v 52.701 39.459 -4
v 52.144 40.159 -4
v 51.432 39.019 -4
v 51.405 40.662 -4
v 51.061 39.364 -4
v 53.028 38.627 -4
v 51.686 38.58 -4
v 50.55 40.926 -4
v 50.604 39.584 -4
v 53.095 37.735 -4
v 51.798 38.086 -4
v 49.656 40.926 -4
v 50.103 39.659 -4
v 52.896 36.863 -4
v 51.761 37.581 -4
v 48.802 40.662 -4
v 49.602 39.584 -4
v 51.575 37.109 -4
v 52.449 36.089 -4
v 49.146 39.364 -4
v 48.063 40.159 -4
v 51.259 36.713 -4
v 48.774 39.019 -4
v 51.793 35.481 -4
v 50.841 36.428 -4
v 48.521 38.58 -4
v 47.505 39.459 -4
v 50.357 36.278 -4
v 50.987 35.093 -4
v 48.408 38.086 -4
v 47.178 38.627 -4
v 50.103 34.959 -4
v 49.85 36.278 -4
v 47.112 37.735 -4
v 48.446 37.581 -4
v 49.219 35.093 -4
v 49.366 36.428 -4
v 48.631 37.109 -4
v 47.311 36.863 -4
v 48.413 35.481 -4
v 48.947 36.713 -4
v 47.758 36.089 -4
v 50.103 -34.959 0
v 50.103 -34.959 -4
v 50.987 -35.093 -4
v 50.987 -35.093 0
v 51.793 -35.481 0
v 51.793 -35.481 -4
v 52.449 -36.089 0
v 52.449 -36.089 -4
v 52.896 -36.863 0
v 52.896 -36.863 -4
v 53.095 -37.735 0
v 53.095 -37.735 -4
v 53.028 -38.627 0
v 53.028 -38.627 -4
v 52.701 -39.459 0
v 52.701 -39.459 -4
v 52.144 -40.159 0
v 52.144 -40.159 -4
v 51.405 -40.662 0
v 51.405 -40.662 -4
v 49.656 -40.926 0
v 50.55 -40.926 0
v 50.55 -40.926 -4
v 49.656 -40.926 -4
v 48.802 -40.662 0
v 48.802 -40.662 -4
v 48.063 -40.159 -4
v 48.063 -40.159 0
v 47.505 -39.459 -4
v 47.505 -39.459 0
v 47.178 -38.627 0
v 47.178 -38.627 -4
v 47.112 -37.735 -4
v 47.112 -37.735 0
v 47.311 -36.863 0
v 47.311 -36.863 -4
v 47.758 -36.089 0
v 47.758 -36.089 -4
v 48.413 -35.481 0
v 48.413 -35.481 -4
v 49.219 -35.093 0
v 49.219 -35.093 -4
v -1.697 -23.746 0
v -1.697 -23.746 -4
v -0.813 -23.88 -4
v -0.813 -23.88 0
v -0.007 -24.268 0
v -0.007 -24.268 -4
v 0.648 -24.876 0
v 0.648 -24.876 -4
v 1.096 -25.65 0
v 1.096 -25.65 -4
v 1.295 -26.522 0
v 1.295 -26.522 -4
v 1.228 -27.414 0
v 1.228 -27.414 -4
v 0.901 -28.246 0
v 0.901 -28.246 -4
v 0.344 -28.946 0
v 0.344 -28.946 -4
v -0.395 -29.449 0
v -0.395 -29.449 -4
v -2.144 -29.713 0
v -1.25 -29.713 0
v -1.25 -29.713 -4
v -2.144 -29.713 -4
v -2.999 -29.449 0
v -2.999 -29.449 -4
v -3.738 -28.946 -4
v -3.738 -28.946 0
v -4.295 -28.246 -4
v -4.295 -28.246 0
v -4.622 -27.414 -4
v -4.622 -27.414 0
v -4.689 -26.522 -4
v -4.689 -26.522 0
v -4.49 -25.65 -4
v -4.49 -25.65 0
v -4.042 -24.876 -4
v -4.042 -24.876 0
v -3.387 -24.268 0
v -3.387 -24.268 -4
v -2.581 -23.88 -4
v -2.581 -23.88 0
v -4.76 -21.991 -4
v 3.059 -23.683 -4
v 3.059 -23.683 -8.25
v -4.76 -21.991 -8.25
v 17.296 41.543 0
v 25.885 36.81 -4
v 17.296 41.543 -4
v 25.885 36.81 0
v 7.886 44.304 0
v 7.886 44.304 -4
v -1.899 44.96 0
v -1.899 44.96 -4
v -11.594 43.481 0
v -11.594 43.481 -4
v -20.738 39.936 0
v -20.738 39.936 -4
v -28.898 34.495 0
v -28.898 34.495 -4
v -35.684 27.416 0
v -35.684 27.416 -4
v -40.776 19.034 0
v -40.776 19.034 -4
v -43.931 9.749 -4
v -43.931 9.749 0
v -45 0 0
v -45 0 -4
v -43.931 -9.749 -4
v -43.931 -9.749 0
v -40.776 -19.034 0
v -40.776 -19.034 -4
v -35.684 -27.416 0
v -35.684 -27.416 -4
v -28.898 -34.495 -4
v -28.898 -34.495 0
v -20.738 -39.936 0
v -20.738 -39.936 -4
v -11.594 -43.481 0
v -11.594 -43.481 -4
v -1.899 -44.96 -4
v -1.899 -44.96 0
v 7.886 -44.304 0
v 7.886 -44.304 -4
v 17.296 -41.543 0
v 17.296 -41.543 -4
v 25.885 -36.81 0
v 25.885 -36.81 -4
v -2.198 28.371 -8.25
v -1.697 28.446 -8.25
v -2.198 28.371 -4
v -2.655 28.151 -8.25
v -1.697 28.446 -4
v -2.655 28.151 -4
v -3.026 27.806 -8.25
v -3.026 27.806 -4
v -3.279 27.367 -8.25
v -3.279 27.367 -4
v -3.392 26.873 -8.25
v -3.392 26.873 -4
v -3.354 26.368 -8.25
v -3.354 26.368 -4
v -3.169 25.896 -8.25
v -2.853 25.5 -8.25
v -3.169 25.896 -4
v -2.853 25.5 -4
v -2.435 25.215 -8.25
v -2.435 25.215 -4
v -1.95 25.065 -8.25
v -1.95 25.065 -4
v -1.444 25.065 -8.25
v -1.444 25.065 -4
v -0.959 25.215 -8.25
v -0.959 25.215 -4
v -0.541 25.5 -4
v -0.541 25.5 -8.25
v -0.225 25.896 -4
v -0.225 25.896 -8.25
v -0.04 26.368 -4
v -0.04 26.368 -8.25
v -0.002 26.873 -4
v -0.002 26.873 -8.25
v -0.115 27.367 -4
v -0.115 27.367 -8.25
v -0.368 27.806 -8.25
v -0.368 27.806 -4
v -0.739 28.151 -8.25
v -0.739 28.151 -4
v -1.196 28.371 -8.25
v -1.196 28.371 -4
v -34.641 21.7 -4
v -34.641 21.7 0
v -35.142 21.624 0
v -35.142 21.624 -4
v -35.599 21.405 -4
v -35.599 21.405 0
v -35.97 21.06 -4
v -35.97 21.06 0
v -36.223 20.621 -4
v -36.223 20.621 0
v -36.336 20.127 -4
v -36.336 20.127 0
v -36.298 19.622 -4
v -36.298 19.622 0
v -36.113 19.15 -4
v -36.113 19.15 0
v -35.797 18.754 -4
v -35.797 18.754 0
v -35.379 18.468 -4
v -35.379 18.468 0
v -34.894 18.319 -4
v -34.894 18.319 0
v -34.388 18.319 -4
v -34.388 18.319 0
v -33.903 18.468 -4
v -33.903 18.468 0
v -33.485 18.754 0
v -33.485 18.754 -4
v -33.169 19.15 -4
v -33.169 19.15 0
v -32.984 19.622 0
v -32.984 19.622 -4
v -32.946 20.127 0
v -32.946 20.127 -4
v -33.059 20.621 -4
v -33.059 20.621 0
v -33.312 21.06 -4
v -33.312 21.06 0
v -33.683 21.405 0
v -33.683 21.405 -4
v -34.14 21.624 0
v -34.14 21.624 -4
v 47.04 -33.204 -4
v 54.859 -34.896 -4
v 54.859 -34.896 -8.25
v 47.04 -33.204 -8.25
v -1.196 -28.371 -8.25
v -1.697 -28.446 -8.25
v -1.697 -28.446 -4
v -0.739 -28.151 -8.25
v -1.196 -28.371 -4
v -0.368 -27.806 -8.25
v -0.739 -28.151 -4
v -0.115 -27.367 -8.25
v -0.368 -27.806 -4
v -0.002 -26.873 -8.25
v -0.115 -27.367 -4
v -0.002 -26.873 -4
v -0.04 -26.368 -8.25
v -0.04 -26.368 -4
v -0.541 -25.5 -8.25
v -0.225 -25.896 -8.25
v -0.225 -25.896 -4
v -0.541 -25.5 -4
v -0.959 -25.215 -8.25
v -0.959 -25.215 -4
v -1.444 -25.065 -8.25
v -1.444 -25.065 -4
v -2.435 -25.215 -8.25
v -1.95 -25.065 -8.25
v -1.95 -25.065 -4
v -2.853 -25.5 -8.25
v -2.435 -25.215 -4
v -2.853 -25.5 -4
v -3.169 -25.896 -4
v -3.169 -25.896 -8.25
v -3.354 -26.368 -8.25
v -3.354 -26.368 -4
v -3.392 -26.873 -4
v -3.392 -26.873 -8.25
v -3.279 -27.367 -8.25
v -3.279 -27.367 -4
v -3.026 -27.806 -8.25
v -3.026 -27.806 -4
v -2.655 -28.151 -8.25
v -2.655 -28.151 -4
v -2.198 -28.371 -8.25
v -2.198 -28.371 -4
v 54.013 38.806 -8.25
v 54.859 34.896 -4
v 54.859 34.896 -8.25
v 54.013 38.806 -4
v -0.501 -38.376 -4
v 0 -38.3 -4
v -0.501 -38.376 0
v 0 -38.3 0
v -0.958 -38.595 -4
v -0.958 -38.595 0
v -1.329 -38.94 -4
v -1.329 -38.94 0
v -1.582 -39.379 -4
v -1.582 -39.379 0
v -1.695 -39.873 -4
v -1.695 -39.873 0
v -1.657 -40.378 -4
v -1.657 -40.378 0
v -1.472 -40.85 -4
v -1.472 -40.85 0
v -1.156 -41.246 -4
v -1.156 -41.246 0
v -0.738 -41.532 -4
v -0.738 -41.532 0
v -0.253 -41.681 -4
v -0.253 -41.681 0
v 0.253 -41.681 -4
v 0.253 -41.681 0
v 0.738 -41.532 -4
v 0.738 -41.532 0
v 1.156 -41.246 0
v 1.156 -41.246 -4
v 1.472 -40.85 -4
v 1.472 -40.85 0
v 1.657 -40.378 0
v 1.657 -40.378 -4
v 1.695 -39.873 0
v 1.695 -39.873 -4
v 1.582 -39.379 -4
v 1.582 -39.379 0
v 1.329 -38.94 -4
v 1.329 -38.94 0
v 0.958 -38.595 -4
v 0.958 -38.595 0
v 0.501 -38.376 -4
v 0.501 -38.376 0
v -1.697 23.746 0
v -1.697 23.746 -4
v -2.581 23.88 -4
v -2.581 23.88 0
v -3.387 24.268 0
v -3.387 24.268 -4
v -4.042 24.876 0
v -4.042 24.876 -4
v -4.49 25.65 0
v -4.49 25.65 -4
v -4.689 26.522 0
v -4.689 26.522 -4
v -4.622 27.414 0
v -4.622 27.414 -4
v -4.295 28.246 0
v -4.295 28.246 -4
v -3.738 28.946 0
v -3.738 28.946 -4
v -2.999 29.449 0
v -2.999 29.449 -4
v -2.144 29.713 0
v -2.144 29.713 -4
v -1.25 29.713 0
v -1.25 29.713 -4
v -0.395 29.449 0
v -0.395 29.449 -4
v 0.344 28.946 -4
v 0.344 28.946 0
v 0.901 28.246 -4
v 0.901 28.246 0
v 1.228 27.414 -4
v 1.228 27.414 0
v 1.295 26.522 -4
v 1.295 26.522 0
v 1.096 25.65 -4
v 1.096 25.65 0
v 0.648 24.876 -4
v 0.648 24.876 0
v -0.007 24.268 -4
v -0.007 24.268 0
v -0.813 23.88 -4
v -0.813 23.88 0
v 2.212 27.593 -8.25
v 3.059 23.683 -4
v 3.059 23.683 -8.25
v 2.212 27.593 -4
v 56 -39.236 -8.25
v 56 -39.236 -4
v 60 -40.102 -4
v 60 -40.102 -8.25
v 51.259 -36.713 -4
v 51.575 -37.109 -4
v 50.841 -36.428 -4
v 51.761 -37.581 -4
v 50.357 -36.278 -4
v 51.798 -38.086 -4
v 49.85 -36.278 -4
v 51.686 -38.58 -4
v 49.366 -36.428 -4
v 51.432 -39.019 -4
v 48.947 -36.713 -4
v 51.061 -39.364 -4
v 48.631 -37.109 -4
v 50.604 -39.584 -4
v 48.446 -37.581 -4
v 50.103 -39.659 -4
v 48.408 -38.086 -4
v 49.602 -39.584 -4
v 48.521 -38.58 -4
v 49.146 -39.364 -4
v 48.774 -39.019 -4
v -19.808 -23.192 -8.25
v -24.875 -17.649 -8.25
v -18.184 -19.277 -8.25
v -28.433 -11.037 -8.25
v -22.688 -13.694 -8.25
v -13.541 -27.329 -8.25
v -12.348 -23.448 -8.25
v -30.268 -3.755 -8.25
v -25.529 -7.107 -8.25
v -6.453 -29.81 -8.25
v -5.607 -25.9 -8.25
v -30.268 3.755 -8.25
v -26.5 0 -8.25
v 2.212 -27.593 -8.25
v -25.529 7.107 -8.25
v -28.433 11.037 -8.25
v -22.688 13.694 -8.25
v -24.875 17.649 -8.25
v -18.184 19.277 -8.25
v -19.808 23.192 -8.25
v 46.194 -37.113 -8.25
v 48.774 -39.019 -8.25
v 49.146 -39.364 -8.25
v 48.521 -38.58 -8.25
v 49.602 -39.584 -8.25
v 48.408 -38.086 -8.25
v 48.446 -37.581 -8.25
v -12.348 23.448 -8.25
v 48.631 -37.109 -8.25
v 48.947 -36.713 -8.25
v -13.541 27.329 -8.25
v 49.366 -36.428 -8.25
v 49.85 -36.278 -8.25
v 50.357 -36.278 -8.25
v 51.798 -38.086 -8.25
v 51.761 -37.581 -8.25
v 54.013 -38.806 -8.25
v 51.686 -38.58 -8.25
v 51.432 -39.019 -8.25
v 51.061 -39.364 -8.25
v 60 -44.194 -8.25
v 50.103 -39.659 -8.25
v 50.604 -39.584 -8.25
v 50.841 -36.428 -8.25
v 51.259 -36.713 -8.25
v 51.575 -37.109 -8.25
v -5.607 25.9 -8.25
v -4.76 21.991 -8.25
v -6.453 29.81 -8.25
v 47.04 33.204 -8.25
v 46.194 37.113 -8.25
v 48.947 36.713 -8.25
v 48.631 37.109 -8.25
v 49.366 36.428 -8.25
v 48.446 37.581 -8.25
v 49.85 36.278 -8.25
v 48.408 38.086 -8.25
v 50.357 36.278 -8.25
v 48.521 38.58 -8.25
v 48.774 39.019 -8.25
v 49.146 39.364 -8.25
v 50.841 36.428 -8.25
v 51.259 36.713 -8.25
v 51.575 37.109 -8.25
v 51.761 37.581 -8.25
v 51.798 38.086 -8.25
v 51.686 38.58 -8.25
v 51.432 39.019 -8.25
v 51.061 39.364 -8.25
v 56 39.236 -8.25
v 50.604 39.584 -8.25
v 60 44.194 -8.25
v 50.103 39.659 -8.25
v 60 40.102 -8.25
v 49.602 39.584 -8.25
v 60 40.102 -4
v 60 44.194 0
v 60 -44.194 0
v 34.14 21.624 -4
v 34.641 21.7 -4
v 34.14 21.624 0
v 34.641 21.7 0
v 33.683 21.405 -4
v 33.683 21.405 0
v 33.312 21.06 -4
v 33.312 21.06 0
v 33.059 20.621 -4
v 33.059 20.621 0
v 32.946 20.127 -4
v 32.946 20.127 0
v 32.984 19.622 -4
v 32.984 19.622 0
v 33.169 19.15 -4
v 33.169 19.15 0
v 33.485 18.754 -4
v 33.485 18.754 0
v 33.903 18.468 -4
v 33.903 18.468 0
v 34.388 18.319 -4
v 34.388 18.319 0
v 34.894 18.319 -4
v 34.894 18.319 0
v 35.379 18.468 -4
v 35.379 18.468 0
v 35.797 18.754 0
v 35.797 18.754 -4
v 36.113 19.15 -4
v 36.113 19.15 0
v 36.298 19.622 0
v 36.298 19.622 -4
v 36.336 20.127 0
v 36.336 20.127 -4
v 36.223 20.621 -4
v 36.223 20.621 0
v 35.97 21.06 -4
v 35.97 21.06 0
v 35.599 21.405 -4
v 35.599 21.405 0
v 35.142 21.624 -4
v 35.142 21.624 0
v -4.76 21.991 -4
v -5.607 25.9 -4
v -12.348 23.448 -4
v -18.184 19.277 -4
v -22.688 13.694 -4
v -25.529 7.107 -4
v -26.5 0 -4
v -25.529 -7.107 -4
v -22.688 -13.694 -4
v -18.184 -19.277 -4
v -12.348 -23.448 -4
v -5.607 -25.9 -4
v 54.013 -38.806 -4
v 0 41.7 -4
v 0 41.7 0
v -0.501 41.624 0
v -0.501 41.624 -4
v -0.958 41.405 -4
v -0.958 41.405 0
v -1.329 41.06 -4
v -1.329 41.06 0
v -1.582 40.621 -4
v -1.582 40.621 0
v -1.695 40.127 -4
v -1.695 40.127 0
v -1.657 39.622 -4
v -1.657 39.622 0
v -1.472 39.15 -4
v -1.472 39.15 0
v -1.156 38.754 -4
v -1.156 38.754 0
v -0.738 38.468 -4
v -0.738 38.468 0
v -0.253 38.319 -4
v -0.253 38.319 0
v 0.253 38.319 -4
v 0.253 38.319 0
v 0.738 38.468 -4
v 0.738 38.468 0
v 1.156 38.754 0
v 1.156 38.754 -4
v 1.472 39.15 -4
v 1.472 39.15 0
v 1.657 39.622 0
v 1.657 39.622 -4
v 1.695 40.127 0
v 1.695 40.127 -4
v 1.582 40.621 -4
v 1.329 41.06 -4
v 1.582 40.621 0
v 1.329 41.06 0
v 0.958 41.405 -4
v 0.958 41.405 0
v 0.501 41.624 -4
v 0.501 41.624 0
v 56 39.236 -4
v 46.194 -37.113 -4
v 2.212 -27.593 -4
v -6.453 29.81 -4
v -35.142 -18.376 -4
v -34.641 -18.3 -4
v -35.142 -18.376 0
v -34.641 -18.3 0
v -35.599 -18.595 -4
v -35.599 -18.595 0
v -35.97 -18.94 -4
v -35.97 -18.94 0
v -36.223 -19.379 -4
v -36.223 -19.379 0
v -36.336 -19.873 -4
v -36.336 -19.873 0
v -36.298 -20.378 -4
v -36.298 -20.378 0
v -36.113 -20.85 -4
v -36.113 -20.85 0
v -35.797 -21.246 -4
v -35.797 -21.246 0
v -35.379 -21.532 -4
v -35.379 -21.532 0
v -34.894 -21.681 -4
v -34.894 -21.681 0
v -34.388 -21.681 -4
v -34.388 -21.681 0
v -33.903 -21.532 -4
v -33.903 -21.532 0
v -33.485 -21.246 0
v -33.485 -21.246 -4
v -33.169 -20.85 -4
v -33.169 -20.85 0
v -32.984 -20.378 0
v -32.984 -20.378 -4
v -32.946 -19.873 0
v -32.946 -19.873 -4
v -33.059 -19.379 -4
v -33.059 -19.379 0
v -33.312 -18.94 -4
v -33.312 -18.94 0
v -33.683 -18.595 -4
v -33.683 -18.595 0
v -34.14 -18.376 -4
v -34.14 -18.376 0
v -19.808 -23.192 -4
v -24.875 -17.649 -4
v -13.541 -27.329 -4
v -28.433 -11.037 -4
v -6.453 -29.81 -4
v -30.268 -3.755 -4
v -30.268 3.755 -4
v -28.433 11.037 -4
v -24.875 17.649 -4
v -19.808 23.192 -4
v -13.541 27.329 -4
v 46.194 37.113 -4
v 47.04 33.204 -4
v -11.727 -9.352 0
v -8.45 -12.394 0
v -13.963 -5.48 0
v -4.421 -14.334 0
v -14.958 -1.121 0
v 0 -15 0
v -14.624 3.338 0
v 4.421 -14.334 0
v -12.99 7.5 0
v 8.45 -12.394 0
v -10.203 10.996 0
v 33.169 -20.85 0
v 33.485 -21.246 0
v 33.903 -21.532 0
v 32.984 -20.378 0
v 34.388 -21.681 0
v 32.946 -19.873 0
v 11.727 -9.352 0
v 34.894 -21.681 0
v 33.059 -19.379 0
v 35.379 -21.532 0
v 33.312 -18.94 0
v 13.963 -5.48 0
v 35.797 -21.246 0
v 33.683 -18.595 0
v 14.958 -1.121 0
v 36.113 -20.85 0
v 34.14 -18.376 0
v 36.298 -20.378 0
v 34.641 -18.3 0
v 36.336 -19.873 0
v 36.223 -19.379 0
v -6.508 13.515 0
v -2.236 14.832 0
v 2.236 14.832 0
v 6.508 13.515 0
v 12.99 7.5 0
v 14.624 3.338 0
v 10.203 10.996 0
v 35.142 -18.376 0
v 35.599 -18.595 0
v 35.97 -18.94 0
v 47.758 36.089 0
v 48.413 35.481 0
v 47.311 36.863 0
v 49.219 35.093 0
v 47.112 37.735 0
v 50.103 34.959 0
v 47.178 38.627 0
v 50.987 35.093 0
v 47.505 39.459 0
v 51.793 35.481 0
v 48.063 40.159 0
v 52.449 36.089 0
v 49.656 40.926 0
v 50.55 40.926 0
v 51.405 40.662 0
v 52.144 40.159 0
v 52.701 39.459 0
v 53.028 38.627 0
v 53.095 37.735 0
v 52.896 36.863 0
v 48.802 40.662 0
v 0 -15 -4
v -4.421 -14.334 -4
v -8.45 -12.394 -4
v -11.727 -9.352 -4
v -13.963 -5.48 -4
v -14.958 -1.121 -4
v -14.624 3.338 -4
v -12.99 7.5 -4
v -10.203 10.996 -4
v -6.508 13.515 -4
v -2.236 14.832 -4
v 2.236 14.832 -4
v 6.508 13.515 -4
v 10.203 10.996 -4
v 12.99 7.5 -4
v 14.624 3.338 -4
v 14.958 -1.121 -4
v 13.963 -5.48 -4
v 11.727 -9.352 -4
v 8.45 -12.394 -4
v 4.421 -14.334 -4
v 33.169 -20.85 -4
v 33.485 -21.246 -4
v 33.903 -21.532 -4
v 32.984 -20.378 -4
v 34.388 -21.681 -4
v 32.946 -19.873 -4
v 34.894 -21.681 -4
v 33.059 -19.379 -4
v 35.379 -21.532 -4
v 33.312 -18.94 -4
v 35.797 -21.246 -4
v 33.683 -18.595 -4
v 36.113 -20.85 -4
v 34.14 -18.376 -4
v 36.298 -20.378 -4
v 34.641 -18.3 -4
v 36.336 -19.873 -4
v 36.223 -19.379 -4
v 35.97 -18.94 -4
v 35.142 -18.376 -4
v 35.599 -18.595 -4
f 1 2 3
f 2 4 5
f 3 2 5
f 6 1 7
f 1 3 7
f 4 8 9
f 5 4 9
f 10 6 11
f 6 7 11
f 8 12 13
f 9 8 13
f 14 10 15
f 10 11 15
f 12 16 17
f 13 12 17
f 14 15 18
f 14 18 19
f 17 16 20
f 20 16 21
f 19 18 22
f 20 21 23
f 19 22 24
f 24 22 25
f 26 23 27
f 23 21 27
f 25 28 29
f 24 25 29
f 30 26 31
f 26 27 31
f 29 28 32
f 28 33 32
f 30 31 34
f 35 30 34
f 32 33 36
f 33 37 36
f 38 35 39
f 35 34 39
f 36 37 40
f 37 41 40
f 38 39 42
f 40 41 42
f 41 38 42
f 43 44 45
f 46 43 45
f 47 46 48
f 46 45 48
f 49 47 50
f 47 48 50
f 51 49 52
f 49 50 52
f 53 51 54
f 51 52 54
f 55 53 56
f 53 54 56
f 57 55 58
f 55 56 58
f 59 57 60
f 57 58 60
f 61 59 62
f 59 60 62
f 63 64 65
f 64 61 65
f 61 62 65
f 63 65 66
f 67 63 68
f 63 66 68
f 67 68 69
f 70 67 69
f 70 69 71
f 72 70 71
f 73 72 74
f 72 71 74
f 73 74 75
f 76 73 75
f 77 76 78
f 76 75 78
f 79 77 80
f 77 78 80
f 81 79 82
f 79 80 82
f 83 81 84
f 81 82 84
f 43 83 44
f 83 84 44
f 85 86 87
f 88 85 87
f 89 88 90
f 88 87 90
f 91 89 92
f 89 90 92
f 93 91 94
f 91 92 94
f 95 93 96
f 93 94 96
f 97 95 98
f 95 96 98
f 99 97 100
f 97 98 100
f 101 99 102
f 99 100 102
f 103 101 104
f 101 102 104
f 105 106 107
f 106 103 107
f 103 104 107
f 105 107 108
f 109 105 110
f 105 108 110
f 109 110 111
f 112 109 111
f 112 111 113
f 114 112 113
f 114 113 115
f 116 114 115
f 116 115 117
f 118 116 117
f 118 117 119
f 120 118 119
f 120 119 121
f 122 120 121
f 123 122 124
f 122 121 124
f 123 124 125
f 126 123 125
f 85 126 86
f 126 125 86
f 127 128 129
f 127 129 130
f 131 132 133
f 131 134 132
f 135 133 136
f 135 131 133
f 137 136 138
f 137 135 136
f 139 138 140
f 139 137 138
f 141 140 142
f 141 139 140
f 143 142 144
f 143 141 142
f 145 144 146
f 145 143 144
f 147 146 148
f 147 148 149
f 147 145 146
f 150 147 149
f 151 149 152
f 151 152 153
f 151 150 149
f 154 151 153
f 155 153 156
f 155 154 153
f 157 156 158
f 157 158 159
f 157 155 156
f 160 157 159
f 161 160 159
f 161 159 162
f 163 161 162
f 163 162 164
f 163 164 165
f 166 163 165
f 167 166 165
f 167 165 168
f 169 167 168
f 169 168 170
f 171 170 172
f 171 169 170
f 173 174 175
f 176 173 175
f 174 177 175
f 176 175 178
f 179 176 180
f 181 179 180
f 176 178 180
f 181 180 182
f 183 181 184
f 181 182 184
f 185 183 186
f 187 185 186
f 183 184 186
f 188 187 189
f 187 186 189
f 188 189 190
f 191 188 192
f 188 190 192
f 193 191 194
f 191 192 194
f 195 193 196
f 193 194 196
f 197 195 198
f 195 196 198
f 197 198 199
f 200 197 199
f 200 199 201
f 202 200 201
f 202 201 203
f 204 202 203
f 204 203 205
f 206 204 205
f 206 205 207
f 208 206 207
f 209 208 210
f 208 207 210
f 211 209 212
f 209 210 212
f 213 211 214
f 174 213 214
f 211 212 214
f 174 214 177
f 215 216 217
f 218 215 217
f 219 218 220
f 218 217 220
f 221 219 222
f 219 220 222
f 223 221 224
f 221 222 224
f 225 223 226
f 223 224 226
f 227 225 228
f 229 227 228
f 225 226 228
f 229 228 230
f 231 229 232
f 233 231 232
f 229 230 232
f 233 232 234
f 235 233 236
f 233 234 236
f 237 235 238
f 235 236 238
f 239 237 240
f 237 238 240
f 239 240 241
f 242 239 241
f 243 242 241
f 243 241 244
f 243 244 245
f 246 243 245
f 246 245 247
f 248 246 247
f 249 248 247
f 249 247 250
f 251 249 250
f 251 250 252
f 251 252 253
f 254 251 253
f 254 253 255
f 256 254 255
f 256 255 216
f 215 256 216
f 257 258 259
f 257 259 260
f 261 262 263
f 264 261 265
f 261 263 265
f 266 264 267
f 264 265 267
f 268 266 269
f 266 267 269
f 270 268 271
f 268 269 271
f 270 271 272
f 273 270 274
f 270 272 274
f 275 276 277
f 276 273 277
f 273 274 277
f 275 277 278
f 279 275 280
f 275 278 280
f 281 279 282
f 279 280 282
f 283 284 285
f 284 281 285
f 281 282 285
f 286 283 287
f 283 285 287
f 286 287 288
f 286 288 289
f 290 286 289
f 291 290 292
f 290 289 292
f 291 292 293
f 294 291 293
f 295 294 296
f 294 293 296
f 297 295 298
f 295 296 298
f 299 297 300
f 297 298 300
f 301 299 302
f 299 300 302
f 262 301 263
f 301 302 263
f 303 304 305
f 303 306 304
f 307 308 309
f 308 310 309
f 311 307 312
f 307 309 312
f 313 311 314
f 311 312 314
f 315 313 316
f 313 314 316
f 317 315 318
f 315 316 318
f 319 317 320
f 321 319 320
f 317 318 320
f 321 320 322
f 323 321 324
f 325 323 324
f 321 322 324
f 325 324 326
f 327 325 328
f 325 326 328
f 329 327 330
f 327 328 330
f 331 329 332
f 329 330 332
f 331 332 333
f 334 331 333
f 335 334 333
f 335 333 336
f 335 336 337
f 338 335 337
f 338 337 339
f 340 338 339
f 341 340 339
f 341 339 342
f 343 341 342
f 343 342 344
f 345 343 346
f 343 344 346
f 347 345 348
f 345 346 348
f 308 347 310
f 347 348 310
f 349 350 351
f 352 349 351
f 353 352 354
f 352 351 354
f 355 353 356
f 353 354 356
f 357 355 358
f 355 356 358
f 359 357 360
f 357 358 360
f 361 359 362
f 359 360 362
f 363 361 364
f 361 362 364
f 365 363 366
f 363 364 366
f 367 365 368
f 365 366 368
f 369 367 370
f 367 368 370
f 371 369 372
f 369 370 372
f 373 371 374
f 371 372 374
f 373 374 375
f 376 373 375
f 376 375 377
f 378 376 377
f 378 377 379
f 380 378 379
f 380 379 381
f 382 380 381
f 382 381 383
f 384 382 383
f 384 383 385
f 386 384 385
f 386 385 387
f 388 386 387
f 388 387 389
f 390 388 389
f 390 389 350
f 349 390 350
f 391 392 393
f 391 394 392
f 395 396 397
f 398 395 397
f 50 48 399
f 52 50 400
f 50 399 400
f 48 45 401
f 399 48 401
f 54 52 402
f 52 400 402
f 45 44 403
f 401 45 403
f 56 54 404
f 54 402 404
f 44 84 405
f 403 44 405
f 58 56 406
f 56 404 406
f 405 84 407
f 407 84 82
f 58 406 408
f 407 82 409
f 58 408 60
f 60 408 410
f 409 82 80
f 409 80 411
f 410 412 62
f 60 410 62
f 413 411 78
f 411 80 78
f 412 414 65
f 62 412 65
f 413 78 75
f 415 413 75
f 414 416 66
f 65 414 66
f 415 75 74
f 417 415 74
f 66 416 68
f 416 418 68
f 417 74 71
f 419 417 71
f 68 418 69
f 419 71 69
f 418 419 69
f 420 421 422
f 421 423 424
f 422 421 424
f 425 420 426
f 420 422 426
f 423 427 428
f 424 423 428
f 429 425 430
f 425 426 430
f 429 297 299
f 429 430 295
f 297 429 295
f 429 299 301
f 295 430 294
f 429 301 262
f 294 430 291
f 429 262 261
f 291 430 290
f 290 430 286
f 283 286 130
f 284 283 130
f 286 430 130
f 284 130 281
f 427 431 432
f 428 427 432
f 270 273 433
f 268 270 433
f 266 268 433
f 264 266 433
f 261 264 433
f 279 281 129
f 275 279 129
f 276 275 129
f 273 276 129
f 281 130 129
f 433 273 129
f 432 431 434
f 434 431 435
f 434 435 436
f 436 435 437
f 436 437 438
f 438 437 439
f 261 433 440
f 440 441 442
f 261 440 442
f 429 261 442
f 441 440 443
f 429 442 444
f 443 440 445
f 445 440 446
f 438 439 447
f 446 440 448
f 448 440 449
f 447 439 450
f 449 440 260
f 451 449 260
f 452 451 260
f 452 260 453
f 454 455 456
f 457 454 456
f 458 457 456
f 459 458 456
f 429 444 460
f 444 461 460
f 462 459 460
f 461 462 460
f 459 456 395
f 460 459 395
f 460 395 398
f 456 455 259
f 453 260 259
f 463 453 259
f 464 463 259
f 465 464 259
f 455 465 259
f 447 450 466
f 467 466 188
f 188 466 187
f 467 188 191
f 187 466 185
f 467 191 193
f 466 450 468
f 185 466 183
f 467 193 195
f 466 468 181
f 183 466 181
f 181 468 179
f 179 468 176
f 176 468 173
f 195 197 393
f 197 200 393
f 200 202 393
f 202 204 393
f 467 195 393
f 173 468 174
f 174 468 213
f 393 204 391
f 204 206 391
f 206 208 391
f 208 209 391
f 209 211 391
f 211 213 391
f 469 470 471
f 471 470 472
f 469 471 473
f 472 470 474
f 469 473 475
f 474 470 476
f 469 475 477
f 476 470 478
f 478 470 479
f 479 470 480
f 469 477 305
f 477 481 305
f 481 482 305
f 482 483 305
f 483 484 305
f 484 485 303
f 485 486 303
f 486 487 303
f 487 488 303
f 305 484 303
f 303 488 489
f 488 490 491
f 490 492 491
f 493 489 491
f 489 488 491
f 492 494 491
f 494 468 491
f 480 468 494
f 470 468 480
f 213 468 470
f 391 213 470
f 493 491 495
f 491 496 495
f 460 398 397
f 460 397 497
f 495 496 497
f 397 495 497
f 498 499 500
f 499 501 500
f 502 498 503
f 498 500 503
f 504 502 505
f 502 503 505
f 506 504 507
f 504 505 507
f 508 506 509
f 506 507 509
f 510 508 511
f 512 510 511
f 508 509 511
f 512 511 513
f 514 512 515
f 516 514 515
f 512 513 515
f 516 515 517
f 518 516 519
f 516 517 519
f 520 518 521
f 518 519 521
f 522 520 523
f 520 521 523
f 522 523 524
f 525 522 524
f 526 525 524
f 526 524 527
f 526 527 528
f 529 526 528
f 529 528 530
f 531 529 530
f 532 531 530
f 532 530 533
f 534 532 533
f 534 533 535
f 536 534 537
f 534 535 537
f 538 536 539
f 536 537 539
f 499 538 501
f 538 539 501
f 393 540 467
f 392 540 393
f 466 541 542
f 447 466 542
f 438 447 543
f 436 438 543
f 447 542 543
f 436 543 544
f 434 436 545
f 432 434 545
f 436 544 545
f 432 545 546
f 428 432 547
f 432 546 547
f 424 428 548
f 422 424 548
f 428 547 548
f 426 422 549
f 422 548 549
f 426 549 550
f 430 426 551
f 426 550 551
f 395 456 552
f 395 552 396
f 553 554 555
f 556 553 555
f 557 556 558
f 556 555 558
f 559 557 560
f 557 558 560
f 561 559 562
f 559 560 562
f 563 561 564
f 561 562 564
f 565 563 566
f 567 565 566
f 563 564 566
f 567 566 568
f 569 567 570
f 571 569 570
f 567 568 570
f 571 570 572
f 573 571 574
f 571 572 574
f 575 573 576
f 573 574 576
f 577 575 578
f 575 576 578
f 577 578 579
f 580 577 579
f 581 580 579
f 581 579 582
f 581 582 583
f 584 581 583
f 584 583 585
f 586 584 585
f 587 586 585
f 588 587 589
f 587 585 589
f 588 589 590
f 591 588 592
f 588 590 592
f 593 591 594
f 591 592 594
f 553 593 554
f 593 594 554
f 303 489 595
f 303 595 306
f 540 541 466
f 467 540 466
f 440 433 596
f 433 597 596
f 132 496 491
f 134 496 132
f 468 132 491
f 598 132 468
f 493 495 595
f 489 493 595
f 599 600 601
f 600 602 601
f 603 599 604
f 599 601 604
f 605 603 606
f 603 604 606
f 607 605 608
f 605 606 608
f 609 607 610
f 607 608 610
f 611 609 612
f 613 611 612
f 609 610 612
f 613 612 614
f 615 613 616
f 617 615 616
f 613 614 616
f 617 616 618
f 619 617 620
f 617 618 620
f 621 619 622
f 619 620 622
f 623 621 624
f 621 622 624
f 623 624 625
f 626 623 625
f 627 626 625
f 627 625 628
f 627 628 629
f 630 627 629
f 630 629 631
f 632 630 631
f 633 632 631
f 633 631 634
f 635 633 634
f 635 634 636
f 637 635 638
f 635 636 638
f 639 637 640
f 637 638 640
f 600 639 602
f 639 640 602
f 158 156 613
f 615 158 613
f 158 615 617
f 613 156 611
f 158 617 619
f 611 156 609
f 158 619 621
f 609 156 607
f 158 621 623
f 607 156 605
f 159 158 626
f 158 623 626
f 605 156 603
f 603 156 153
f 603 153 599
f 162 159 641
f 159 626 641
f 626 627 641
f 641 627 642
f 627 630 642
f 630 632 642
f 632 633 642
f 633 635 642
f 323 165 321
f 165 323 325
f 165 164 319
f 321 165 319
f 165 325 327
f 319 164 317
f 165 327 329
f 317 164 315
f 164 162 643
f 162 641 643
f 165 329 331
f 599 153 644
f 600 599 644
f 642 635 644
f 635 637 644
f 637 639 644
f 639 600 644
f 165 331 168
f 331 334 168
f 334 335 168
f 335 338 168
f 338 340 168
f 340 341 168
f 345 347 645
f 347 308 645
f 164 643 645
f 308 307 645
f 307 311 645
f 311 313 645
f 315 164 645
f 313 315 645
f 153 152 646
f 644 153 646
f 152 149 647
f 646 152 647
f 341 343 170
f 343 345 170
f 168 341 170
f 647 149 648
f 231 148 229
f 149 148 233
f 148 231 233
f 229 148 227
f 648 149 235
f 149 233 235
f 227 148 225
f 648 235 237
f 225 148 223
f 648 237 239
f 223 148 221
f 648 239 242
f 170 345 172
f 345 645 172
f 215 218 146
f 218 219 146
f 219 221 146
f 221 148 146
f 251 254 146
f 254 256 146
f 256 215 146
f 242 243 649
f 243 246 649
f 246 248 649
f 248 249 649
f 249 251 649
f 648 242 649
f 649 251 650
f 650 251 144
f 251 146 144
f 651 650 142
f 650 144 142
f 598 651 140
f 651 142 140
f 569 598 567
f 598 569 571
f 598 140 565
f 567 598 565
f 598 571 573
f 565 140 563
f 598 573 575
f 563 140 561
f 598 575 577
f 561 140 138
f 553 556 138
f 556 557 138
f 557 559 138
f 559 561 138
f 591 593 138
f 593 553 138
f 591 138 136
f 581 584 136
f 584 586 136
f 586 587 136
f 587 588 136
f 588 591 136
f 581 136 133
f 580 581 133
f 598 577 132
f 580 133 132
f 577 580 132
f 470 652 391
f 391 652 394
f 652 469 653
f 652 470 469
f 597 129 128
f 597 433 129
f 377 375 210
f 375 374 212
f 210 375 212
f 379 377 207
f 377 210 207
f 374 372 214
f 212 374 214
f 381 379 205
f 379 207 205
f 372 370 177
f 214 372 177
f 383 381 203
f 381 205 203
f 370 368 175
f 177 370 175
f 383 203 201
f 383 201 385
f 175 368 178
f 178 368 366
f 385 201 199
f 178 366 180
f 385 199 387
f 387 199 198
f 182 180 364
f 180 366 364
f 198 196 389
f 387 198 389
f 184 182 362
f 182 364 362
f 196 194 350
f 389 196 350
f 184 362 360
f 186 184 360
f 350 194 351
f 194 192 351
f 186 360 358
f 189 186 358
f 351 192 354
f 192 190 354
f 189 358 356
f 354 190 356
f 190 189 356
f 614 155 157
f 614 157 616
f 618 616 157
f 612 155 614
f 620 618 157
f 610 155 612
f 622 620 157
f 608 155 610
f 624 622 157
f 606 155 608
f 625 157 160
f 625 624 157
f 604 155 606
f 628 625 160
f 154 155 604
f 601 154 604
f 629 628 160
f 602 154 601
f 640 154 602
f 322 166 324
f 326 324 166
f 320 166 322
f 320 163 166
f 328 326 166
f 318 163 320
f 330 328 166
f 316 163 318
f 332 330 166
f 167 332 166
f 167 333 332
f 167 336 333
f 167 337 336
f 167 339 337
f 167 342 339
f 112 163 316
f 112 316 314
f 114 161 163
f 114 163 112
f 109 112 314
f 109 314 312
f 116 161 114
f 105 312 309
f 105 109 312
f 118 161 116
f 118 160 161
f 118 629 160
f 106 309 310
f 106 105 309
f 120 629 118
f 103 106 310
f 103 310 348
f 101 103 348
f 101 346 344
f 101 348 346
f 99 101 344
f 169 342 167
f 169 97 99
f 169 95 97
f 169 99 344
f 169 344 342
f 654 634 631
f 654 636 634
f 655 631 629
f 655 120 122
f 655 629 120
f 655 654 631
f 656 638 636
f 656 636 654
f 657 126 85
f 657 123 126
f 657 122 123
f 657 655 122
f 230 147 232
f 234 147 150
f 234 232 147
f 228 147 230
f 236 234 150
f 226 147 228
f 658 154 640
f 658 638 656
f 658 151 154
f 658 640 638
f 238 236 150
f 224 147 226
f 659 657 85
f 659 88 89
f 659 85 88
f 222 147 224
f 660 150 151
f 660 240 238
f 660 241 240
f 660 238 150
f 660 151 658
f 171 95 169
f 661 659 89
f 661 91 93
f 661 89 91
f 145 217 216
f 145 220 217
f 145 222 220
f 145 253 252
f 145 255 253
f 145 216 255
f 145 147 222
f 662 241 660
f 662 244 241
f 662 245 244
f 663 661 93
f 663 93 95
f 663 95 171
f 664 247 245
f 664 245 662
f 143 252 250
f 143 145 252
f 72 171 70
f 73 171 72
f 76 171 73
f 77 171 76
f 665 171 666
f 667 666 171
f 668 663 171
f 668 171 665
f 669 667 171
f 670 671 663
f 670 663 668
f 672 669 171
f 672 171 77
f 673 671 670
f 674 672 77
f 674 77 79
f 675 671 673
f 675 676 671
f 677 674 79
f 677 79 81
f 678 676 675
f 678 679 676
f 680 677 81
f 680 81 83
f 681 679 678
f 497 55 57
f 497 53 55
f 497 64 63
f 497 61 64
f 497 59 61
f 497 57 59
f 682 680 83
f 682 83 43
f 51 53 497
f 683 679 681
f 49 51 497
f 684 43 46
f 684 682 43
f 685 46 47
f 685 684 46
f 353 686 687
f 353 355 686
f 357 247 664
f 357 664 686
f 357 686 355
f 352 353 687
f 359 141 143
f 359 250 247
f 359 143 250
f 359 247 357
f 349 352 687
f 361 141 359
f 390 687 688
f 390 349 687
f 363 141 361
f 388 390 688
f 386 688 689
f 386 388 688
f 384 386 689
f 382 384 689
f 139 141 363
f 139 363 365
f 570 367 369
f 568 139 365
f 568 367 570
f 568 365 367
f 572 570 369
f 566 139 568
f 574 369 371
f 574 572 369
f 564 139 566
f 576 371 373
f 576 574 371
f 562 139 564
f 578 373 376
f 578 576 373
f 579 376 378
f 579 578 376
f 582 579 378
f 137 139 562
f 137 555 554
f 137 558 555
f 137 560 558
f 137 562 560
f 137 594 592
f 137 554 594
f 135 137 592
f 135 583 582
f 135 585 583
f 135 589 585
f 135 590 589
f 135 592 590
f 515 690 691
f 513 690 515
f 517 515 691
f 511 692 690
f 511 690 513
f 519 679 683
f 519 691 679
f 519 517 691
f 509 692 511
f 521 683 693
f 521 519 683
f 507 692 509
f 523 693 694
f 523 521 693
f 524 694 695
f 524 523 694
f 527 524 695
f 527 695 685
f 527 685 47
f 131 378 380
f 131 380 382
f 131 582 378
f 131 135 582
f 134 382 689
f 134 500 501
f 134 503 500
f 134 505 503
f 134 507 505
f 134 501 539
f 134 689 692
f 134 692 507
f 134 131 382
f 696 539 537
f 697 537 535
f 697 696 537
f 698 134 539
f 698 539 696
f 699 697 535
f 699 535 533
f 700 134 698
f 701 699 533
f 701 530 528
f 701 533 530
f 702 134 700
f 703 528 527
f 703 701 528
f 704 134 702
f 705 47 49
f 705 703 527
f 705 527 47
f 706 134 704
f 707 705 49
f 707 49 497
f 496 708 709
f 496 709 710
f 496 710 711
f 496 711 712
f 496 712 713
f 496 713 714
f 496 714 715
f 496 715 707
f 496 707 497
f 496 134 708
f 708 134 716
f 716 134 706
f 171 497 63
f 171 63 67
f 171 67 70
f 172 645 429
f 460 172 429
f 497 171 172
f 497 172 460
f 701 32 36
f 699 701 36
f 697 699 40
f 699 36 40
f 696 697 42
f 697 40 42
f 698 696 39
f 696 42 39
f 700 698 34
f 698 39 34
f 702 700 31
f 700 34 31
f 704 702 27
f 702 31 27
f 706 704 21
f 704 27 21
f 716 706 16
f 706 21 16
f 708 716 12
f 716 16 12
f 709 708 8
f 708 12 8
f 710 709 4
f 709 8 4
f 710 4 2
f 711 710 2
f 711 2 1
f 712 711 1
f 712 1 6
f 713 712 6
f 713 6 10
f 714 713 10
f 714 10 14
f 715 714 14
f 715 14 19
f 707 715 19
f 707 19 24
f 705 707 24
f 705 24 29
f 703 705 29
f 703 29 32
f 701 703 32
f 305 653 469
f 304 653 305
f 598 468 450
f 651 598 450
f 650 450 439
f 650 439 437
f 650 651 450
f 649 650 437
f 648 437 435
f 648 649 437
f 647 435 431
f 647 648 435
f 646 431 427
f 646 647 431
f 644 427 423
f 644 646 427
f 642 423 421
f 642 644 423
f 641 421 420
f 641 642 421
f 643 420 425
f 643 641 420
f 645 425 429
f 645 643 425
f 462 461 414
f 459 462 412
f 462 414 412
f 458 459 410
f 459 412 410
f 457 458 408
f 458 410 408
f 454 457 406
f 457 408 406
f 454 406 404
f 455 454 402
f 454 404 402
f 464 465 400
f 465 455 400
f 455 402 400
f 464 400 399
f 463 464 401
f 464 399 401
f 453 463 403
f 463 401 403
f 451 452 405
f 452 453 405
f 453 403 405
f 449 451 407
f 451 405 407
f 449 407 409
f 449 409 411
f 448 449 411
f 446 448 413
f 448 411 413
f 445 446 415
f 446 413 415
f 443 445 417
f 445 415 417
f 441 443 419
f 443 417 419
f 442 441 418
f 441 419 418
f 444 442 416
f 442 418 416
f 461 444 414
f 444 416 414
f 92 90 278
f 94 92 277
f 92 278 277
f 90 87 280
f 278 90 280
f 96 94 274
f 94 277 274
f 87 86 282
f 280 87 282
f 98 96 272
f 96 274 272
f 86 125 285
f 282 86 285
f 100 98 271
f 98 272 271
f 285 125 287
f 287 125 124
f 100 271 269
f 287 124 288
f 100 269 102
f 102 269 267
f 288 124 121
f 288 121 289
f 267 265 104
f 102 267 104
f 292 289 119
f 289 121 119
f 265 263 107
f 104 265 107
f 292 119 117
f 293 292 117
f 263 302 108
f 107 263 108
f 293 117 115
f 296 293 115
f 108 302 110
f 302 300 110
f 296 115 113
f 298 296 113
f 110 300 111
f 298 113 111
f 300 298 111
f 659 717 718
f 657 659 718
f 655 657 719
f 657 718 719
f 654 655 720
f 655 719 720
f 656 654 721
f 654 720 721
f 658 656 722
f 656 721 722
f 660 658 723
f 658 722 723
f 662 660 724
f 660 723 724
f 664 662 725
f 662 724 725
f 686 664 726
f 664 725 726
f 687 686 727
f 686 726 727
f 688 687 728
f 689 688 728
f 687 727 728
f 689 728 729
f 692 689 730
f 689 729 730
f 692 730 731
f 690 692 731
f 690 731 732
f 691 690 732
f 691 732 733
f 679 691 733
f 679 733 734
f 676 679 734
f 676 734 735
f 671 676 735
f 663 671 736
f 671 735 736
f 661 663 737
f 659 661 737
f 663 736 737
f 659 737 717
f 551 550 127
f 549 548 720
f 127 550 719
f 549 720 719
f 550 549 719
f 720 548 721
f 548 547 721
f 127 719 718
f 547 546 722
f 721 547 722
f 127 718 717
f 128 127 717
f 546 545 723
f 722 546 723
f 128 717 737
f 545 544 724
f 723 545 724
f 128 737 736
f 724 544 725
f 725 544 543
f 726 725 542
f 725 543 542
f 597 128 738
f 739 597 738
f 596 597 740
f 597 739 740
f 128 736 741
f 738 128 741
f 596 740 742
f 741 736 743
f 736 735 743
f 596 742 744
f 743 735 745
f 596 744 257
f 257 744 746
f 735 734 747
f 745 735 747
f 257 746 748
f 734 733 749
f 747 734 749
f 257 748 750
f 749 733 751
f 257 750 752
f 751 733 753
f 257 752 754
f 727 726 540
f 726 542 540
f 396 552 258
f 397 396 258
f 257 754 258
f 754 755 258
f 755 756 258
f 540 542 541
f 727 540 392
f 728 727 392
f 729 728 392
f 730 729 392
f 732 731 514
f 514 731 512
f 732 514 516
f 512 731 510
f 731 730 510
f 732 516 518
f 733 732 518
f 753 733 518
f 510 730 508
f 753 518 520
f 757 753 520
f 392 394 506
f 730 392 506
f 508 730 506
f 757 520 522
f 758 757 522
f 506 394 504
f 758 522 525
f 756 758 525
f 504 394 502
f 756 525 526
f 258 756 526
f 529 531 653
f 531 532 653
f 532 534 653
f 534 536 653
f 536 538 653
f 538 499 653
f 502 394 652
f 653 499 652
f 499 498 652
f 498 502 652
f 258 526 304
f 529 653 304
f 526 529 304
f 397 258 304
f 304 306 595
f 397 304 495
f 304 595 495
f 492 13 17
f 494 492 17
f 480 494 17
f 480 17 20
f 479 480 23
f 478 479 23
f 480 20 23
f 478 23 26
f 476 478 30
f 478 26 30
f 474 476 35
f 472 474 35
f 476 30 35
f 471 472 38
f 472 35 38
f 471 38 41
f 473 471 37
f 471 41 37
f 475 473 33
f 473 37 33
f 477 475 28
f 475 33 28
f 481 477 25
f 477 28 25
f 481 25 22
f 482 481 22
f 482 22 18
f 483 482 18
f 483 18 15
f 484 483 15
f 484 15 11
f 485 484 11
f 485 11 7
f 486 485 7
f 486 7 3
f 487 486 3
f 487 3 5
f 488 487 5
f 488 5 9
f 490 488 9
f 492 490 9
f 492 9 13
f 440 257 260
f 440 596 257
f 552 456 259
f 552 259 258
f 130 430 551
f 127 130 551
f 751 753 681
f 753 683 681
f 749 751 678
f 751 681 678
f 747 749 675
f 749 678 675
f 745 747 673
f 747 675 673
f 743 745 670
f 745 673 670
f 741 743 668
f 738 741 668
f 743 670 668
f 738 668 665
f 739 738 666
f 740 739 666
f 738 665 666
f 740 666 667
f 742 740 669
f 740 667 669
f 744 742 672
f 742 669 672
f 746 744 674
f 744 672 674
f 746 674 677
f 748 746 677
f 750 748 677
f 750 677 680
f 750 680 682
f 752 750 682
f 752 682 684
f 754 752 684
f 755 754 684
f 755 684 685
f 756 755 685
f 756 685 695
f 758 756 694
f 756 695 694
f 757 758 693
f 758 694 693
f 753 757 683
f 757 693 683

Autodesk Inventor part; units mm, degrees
ref_plane "YZ Plane" through (0, 0, 0) normal (1, 0, 0) x (0, 1, 0)
ref_plane "XZ Plane" through (0, 0, 0) normal (0, 1, 0) x (-1, 0, 0)
ref_plane "XY Plane" through (0, 0, 0) normal (0, 0, 1) x (1, 0, 0)
sketch "Sketch1" plane through (0, 0, 0) normal (0, 0, 1) x (1, 0, 0)
  circle A0 centre (0, 0) radius 30.5
  circle A1 centre (141.8, 0) radius 60.5
  line L0 (129.0003, 59.1305) -> (-6.4528, 29.8096)
  line L1 (-6.4528, -29.8096) -> (129.0003, -59.1305)
  line L2 (60, 44.1943) -> (60, -44.1943)
  dimension "d0" = 61
  dimension "d1" = 121
  dimension "d2" = 141.8
  dimension "d3" = 60
extrude "Extrusion1" add sketch "Sketch1" against normal blind 8.25 contours A0 | A0 L0 L2 L1
shell "Shell1" thickness 4 removed faces 1 at (37.8491, -9.9365, -8.25)
sketch "Sketch6" plane through (0, 0, 0) normal (0, 0, 1) x (1, 0, 0)
  point P0 (0, 0)
  point P1 (0, 0)
hole "Hole3" at (0, 0, 0) direction (0, 0, -1) diameter 30 end through all
sketch "Sketch12" plane through (0, 0, 0) normal (0, 0, 1) x (1, 0, 0)
  circle A0 centre (0, 0) radius 45
  circle A1 centre (0, 0) radius 15
  circle A2 centre (0, 0) radius 15 projected
  dimension "d55" = 90
extrude "Extrusion5" add sketch "Sketch12" against normal blind 4
sketch "Sketch7" plane through (56, -39.2358, -4) normal (0, 0, -1) x (-1, 0, 0)
  line L0 (26.9325, 5.83) -> (-25.6804, -5.5589)
  line L1 (-25.6804, -5.5589) -> (-25.6804, 84.0306)
  line L2 (-25.6804, 84.0306) -> (28.864, 72.2236)
  line L3 (28.864, 72.2236) -> (24.7276, 5.3527)
  line L4 (61.6065, 13.3357) -> (0, 0) projected
  line L5 (0, 78.4716) -> (61.6065, 65.136) projected
  point P0 (56, 39.2358)
extrude "Extrusion2" cut sketch "Sketch7" along normal through all
sketch "Sketch8" plane through (-5.6065, 25.9001, -8.25) normal (0.2115656, -0.9773638, 0) x (0.9773638, 0.2115656, 0)
  line L0 (0, 4.25) -> (0, 0) projected
  line L1 (67.126, 0) -> (0, 0) projected
  line L2 (0, 4.25) -> (8, 4.25)
  line L3 (8, 4.25) -> (8, 0)
  line L4 (8, 0) -> (0, 0)
  line L5 (0, 0) -> (0, 4.25)
  line L6 (53, 4.25) -> (61, 4.25)
  line L7 (61, 4.25) -> (61, 0)
  line L8 (61, 0) -> (53, 0)
  line L9 (53, 0) -> (53, 4.25)
  point P0 (0, 8.25)
  dimension "d33" = 8
  dimension "d34" = 8
  dimension "d35" = 45
extrude "Extrusion3" add sketch "Sketch8" along normal blind 4
sketch "Sketch9" plane through (0, 0, -8.25) normal (0, 0, -1) x (-1, 0, 0)
  line L0 (4.7602, 21.9907) -> (-3.0587, 23.6832) projected
  line L1 (-60, 44.1943) -> (-25.8853, 36.8097) projected
  line L2 (-46.1938, 37.1131) -> (-47.0401, 33.2037) projected
  line L3 (-47.0401, 33.2037) -> (-53.1727, 42.6863)
  line L4 (-1.3662, 31.5021) -> (4.7602, 21.9907)
  line L5 (-3.0587, 23.6832) -> (6.4528, 29.8096)
  line L6 (-47.0401, 33.2037) -> (-54.859, 34.8962) projected
  line L7 (-54.859, 34.8962) -> (-45.3475, 41.0226)
  point P0 (0, 0)
  point P1 (-50.1032, 37.9594)
  point P2 (1.697, 26.7464)
hole "Hole4" at (50.1032, 37.9594, -8.25) at (-1.697, 26.7464, -8.25) direction (0, 0, 1) diameter 3.4 end through all clearance for "Countersunk Flat Head Screw ISO 2009/7046" size "M3" standard "ISO"
sketch "Sketch10" plane through (0, 0, 0) normal (0, 0, 1) x (1, 0, 0)
  circle A0 centre (50.1032, 37.9594) radius 1.7 projected
  circle A1 centre (-1.697, 26.7464) radius 1.7 projected
  point P0 (0, 0)
hole "Hole5" at (50.1032, 37.9594, 0) at (-1.697, 26.7464, 0) direction (0, 0, -1) diameter 6 depth 4
mirror "Mirror1" about plane through (0, 0, 0) normal (0, 1, 0) of "Extrusion3", "Hole4", "Hole5"
sketch "Sketch13" plane through (0, 0, -4) normal (0, 0, -1) x (-1, 0, 0)
  line L0 (0, -40) -> (-34.641, -20)
  line L1 (-34.641, -20) -> (-34.641, 20)
  line L2 (-34.641, 20) -> (0, 40)
  line L3 (0, 40) -> (34.641, 20)
  line L4 (34.641, 20) -> (34.641, -20)
  line L5 (34.641, -20) -> (0, -40)
  point P0 (0, 0)
  point P1 (0, 0)
  dimension "d59" = 80
hole "Hole6" at (34.641, -20, -4) at (0, -40, -4) at (-34.641, -20, -4) at (-34.641, 20, -4) at (0, 40, -4) at (34.641, 20, -4) direction (0, 0, 1) diameter 3.4 end through all clearance for "Countersunk Flat Head Screw DIN EN ISO 2009" size "M3" standard "DIN"
equation "\"d34\" = d33"
properties part number "J1-sketch"
